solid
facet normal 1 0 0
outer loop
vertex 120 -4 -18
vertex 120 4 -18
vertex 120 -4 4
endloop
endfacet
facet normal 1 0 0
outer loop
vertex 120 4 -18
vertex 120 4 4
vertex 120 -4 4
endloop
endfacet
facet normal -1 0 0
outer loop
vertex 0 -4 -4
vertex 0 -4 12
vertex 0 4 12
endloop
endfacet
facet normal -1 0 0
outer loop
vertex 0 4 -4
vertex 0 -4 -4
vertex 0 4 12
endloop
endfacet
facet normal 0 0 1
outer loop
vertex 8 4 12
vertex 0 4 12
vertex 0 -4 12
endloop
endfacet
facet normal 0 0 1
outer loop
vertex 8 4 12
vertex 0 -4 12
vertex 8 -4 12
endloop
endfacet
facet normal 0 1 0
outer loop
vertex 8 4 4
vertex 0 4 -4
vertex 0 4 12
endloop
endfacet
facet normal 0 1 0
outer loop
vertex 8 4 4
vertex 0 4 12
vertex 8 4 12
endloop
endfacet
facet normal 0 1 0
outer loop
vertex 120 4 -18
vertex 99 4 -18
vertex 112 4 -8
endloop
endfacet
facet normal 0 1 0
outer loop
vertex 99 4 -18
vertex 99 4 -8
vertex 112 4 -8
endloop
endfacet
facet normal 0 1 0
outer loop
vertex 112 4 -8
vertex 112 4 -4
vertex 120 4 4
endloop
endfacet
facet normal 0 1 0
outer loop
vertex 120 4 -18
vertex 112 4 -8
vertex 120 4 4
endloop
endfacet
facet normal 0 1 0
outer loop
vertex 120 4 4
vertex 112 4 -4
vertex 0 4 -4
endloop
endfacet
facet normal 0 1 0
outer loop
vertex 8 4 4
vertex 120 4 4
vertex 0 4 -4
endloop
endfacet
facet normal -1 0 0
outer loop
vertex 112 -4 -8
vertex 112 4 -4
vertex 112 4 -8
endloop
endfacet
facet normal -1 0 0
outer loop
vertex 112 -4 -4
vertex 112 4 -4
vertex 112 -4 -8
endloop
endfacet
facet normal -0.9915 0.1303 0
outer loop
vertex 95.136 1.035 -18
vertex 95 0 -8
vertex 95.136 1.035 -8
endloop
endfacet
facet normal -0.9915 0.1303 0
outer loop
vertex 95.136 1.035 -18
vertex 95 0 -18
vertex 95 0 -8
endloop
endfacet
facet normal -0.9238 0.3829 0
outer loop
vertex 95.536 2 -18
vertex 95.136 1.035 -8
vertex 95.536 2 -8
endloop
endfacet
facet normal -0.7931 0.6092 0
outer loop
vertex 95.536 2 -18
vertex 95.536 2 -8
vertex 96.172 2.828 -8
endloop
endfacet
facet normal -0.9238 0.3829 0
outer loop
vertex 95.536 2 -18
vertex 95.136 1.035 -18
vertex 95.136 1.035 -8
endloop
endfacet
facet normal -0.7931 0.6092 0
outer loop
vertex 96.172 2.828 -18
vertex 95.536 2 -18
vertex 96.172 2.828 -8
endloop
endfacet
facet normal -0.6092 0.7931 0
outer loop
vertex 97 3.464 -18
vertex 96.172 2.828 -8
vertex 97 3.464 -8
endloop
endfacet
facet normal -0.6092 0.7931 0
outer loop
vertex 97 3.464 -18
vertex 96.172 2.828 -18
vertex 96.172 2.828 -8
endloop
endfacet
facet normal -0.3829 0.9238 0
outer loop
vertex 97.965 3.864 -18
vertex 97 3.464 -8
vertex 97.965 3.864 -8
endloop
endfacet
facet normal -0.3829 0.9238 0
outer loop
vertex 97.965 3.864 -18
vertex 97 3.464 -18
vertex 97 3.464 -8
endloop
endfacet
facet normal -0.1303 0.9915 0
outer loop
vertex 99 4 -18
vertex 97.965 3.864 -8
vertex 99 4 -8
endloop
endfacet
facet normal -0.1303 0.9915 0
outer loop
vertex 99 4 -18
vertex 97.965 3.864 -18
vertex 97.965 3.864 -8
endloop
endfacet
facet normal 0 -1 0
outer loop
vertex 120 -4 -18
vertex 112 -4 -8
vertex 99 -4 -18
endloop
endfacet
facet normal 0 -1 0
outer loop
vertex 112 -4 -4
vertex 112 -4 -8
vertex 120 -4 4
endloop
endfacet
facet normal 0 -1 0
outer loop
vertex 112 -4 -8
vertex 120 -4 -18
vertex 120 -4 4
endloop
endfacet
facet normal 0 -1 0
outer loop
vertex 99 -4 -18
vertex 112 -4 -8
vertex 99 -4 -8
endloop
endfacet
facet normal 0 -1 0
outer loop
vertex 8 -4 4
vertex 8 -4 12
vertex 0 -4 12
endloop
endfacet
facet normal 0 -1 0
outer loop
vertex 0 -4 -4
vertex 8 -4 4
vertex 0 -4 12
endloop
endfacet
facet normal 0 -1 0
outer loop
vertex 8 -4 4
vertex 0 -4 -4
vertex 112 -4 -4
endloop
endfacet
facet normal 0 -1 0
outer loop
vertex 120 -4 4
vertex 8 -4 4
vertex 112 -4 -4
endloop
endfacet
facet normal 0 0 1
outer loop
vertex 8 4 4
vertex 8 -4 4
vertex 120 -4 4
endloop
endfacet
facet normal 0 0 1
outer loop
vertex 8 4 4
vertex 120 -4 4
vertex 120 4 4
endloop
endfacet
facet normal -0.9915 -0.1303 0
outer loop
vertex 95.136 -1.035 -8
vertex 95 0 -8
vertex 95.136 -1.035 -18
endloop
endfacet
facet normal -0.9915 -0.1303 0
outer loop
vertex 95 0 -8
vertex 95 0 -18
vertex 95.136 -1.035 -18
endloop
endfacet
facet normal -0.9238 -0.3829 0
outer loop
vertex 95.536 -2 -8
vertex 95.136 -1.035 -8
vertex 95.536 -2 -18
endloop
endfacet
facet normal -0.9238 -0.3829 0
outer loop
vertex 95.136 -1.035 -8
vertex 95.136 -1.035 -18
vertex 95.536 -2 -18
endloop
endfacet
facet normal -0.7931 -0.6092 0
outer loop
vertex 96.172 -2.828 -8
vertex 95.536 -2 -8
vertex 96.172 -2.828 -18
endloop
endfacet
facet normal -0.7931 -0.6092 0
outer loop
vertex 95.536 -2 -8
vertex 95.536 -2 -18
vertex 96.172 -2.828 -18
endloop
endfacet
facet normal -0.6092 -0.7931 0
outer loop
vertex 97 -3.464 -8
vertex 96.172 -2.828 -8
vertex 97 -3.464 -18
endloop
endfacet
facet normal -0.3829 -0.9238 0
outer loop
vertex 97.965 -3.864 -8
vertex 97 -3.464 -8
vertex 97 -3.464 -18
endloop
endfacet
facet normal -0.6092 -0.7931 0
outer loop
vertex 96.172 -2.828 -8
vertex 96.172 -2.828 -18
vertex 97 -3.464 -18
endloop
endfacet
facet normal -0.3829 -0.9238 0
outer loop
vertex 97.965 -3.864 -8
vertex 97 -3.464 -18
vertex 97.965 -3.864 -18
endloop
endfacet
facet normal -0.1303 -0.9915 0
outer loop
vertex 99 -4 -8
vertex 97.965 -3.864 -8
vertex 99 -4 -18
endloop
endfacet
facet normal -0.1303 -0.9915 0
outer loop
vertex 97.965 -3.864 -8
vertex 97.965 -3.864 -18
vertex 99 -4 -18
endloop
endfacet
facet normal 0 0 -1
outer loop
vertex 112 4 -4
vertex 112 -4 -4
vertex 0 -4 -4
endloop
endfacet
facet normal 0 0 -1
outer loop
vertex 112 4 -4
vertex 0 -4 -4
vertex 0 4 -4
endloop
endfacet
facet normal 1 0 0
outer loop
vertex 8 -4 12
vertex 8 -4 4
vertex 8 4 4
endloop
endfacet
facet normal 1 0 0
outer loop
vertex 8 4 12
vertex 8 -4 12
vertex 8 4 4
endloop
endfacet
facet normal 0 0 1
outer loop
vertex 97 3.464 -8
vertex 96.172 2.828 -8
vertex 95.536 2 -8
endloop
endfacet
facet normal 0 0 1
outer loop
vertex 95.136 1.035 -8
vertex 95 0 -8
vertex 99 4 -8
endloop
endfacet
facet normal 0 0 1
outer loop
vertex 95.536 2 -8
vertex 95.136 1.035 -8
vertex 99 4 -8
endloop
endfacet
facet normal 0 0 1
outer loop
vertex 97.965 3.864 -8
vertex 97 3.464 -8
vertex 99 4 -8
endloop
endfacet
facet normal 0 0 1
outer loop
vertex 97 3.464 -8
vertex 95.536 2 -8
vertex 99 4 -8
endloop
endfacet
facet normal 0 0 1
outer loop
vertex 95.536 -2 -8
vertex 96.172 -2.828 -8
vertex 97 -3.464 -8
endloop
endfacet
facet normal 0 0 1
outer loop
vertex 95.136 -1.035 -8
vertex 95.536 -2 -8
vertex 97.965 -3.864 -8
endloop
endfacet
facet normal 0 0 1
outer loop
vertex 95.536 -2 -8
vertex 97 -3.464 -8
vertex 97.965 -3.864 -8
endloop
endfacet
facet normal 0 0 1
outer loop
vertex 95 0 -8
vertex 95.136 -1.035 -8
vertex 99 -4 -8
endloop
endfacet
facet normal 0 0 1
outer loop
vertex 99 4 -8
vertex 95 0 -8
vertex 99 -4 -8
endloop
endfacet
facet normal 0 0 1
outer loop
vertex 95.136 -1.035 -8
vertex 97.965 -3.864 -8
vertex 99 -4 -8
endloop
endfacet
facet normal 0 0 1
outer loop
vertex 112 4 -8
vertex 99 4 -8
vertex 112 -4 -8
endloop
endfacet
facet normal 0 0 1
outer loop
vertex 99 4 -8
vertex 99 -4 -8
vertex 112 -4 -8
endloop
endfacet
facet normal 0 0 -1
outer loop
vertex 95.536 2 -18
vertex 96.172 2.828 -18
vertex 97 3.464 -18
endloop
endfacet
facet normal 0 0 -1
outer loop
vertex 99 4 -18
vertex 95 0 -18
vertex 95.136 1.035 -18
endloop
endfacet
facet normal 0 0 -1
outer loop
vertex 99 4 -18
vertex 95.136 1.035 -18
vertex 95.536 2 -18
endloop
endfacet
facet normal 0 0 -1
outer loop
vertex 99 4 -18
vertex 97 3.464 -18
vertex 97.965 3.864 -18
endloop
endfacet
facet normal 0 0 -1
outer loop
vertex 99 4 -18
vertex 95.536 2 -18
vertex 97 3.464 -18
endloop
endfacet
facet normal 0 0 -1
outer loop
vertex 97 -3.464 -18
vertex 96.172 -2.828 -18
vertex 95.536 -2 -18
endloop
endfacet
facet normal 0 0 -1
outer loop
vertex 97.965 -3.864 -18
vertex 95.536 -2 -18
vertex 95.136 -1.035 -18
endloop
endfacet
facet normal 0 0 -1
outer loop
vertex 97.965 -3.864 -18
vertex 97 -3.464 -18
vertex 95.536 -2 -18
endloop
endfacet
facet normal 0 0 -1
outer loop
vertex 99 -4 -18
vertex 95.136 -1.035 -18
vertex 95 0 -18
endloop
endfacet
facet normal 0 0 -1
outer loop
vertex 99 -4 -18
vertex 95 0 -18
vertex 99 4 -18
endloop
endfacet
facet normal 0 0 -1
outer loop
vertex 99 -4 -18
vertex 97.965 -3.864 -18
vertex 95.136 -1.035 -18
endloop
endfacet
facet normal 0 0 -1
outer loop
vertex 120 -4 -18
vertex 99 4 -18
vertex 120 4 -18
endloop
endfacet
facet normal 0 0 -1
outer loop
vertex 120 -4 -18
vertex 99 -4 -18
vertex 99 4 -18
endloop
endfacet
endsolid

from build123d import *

# Parameters (mm, degrees)
F0_W     = 8
F0_H     = 8
F1_DEPTH = 120
F2_W     = 8
F2_H     = 8
F3_DEPTH = 8
F4_W     = 8
F4_H     = 8
F5_DEPTH = 4
F6_W     = 17
F6_H     = 8
F6_W_2   = 8
F7_DEPTH = 10
F8_R     = 3.99999


# Not quite as in the source:
# - a fillet or chamfer is up to 0.001 mm smaller than in the source, because OpenCascade refuses the exact size


with BuildPart() as f1:
    # F0 (on Right) → F1 (new body)
    with BuildSketch(Plane.YZ):
        Rectangle(F0_W, F0_H)
    extrude(amount=F1_DEPTH)

    # F2 (on face) → F3 (join)
    with BuildSketch(Plane.XY.offset(4)):
        with Locations((4, 0)):
            Rectangle(F2_W, F2_H)
    extrude(amount=F3_DEPTH)

    # F4 (on face) → F5 (join)
    with BuildSketch(Plane(origin=(0, 0, -4), x_dir=(1, 0, 0), z_dir=(0, 0, -1))):
        with Locations((116, 0)):
            Rectangle(F4_W, F4_H)
    extrude(amount=F5_DEPTH)

    # F6 (on face) → F7 (join)
    with BuildSketch(Plane(origin=(0, 0, -8), x_dir=(1, 0, 0), z_dir=(0, 0, -1))):
        with Locations((103.5, 0)):
            Rectangle(F6_W, F6_H)
        with Locations((116, 0)):
            Rectangle(F6_W_2, F6_H)
    extrude(amount=F7_DEPTH)

    # F8 (radius 4 in the source; OpenCascade refuses exactly that, so slightly less here)
    f8_edges = [f1.edges().sort_by_distance(p)[0] for p in [
        (95, -4, -13),
        (95, 4, -13),
    ]]
    fillet(f8_edges, radius=F8_R)


solid = f1.part
